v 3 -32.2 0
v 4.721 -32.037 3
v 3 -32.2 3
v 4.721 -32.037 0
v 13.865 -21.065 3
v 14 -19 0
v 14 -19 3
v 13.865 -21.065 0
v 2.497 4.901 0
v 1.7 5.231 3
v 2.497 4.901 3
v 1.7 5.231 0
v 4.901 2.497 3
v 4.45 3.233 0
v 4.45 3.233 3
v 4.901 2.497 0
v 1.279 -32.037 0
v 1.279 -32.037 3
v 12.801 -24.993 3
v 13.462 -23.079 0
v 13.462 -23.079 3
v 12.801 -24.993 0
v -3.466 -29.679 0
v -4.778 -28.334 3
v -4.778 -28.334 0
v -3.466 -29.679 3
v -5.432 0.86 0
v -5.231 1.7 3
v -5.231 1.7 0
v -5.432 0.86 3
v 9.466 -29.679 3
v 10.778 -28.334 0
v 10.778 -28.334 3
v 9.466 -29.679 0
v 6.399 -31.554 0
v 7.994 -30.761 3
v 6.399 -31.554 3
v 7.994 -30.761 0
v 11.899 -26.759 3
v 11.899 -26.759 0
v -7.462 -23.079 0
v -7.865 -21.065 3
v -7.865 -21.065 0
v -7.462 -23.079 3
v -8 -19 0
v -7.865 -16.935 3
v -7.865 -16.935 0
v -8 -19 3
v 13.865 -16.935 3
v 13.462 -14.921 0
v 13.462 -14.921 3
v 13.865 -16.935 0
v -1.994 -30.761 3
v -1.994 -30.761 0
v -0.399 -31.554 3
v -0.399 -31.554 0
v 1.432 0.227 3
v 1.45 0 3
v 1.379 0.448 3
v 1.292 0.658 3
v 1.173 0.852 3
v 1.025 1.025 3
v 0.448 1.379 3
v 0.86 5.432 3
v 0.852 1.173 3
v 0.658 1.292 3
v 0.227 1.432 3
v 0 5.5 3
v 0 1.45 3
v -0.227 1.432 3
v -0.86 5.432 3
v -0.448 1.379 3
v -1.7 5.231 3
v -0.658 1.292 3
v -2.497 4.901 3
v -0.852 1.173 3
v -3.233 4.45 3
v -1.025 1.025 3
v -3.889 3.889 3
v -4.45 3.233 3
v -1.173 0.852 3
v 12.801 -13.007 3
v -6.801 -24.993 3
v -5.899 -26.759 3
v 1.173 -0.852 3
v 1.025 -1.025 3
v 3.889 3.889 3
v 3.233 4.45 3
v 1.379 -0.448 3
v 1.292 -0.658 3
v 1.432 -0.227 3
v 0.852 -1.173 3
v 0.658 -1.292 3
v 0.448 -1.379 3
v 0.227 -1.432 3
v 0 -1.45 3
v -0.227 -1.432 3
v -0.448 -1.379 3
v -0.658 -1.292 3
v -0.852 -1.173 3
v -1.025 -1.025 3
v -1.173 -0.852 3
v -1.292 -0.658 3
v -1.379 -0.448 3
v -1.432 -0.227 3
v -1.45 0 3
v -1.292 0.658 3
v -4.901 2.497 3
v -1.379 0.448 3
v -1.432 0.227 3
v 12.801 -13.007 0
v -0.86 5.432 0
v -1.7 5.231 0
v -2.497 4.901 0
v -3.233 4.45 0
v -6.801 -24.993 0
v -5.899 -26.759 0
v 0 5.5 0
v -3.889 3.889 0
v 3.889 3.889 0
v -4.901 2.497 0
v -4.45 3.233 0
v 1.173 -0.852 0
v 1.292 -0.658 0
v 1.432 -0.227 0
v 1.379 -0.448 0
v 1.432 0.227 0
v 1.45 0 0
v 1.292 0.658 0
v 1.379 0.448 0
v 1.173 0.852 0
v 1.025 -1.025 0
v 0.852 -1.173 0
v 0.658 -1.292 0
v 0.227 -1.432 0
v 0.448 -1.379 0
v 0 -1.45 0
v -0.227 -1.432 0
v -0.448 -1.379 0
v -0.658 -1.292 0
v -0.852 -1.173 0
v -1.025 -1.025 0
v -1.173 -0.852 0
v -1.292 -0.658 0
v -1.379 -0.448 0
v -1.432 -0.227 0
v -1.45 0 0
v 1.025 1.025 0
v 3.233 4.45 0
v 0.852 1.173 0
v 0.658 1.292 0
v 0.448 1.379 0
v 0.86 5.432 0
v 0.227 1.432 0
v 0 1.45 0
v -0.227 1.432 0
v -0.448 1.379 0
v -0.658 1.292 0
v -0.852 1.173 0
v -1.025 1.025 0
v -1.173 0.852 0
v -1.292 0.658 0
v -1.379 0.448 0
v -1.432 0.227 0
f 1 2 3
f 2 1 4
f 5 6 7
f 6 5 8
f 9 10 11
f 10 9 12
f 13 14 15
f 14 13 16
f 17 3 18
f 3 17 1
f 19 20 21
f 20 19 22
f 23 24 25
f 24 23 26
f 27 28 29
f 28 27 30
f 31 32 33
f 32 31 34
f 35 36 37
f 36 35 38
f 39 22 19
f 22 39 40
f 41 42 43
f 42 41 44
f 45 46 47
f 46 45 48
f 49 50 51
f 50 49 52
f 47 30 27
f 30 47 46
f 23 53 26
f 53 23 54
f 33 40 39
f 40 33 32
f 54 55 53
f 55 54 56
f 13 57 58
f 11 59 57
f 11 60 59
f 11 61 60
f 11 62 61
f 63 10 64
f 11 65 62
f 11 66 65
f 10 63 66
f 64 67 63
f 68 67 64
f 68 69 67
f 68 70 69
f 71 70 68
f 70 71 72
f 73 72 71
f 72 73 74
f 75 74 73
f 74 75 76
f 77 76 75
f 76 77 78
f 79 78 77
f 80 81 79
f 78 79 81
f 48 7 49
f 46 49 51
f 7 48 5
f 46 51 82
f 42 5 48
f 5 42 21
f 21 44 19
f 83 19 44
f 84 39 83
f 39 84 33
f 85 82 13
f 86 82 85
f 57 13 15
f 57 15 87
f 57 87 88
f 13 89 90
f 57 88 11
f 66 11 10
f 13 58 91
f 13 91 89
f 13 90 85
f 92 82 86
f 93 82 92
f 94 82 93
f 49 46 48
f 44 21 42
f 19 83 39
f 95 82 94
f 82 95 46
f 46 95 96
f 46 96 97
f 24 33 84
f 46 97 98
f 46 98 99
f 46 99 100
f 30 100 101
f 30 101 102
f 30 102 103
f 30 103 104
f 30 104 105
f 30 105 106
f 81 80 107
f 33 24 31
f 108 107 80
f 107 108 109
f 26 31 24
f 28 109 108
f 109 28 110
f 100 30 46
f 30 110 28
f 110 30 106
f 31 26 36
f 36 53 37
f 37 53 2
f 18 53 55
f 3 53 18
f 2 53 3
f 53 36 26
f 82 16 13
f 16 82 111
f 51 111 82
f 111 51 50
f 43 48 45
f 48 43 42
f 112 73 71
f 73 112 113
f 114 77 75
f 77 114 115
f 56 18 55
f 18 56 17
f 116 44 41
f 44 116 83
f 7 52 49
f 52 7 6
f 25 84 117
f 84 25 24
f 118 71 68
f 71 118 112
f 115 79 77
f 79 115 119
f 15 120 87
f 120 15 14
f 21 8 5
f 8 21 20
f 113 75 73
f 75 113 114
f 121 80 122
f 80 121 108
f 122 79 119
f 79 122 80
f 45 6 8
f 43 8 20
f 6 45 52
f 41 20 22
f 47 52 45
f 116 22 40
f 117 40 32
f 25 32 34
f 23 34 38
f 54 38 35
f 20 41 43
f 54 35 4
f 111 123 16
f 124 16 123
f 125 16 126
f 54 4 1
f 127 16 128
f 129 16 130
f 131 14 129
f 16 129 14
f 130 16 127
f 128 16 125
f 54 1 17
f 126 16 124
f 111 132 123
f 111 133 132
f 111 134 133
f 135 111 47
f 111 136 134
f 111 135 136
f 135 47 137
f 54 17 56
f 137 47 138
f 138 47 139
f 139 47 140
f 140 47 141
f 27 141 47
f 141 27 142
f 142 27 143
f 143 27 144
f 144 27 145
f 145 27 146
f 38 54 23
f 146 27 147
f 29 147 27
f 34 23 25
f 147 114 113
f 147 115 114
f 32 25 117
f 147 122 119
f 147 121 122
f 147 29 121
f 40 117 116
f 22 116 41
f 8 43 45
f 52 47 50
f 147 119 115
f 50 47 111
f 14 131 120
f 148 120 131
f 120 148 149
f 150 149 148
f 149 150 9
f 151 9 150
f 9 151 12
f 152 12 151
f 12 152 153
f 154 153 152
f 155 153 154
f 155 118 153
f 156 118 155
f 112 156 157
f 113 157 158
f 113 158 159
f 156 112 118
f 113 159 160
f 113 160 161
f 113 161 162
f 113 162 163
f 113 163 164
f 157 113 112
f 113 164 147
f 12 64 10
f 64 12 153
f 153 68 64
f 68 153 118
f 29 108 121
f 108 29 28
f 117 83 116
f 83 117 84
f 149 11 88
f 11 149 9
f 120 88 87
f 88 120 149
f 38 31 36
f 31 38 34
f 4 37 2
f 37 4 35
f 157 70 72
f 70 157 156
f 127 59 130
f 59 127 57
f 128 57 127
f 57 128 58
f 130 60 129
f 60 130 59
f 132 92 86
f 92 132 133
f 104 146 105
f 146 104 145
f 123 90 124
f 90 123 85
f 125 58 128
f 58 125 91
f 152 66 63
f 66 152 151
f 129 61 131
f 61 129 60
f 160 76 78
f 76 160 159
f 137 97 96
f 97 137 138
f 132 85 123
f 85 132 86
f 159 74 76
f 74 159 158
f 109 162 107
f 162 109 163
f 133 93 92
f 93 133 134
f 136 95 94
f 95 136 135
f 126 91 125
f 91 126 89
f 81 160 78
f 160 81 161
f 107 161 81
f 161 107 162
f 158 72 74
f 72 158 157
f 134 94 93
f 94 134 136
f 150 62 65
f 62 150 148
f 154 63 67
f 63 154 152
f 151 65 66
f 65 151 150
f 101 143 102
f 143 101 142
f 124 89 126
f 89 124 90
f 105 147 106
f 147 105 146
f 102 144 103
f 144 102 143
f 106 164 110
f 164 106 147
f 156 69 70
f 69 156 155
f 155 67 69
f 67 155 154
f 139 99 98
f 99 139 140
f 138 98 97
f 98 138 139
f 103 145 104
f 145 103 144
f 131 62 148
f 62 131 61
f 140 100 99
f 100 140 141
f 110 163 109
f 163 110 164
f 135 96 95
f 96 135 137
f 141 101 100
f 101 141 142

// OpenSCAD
// file: dog-puppy-common.scad
// Shared numbers for the puppy look (checkpoint 6). Units mm, whole-dog coordinates:
// x = forward, y = left, z = up, z=0 is the underside of Dog body V1 (dog-body-v1.scad).
// Included by dog-deck-v2, dog-shell-v1, dog-head-v1, dog-ears-v1 and the assembly render.
deck_z=30; deck_t=3; deck_top=deck_z+deck_t;    // deck sits on the 30mm body walls
clr=0.5;                                        // per side; this printer makes holes small
m2_pilot=1.7;                                   // M2 machine screw cuts its own thread in PLA
m2_free=2.9;                                    // M2 passes through freely (Leg V4 lesson)
wall=2;                                         // shell and head wall

// body shell: one big round bean that hides the frame, servos and hips. Open belly: only the
// lower legs poke out underneath. It is a hull of four big balls, cut flat at the bottom.
shell=[150,120]; shell_bot=2; shell_top=68;
shell_R=41;
// leg points that must stay inside (from Leg V6 at +/-40 deg; leg y from the SG90 drawing, not measured)
leg_out_y=46; leg_top=[58,35]; hip=[52,8];   // [x,z] of the upper-tail tip and the hip disc bottom-front
servo_top=21.5;

// neck: a hollow tube on the deck. The shell rests on its shoulder; the head sits on its top.
neck_lo=[[26,50],16];   // x range, half width (below the shell roof)
neck_hi=[[28,48],12];   // x range, half width (through the hole in the shell roof)
neck_wall=3;

// head: round at the back and top, flat face at the front for the screen
// The head's lower edge is cut to hug the body, so it sits snugly on the shoulders.
head=[80,82]; head_cx=62; head_bot=56; head_top=140;
head_R=30; face_w=52; face_z=[82,122]; face_r=14;   // flat face: just big enough for the screen
chin_z=73; chin_t=3;    // flat plate inside the head, on top of the neck
ear_x=44; ear_z=110;

module shell_solid(o=0) intersection() {
  hull() for(sx=[-1,1],sy=[-1,1]) translate([sx*(shell[0]/2-shell_R),sy*(shell[1]/2-shell_R),shell_top-shell_R]) sphere(shell_R-o);
  translate([-200,-200,shell_bot-(o>0?1:0)]) cube([400,400,200]);
}
module head_solid(o=0) intersection() {
  hull() {
    for(sy=[-1,1],z=[head_top-head_R, head_bot+head_R*0.4]) translate([head_cx-head[0]/2+head_R,sy*(head[1]/2-head_R),z]) sphere(head_R-o);
    // flat face: a rounded rectangle standing at the front
    translate([head_cx+head[0]/2-o-0.01,0,0]) rotate([0,90,0]) linear_extrude(0.01) hull()
      for(sy=[-1,1],z=[face_z[0]+face_r, face_z[1]-face_r]) translate([-z,sy*(face_w/2-face_r)]) circle(face_r-o);
  }
  translate([-200,-200,head_bot-(o>0?1:0)]) cube([400,400,200]);
}
module head_outer() difference() { head_solid(0); shell_solid(-clr); }
// main file
// Dog ears V1 (puppy). Print 2, flat, no supports. Try a different colour!
// A floppy ear: the M2 x 10 screw goes through the top hole, through the head and into the
// chin post. The ear hangs about 31mm below the screw. Flip one over so they make a pair.
include <dog-puppy-common.scad>
$fn=40;
ear_t=3;
difference() {
  linear_extrude(ear_t) hull() { circle(d=11); translate([3,-19]) scale([1,1.2]) circle(d=22); }
  translate([0,0,-1]) cylinder(d=m2_free,h=ear_t+2);
}
